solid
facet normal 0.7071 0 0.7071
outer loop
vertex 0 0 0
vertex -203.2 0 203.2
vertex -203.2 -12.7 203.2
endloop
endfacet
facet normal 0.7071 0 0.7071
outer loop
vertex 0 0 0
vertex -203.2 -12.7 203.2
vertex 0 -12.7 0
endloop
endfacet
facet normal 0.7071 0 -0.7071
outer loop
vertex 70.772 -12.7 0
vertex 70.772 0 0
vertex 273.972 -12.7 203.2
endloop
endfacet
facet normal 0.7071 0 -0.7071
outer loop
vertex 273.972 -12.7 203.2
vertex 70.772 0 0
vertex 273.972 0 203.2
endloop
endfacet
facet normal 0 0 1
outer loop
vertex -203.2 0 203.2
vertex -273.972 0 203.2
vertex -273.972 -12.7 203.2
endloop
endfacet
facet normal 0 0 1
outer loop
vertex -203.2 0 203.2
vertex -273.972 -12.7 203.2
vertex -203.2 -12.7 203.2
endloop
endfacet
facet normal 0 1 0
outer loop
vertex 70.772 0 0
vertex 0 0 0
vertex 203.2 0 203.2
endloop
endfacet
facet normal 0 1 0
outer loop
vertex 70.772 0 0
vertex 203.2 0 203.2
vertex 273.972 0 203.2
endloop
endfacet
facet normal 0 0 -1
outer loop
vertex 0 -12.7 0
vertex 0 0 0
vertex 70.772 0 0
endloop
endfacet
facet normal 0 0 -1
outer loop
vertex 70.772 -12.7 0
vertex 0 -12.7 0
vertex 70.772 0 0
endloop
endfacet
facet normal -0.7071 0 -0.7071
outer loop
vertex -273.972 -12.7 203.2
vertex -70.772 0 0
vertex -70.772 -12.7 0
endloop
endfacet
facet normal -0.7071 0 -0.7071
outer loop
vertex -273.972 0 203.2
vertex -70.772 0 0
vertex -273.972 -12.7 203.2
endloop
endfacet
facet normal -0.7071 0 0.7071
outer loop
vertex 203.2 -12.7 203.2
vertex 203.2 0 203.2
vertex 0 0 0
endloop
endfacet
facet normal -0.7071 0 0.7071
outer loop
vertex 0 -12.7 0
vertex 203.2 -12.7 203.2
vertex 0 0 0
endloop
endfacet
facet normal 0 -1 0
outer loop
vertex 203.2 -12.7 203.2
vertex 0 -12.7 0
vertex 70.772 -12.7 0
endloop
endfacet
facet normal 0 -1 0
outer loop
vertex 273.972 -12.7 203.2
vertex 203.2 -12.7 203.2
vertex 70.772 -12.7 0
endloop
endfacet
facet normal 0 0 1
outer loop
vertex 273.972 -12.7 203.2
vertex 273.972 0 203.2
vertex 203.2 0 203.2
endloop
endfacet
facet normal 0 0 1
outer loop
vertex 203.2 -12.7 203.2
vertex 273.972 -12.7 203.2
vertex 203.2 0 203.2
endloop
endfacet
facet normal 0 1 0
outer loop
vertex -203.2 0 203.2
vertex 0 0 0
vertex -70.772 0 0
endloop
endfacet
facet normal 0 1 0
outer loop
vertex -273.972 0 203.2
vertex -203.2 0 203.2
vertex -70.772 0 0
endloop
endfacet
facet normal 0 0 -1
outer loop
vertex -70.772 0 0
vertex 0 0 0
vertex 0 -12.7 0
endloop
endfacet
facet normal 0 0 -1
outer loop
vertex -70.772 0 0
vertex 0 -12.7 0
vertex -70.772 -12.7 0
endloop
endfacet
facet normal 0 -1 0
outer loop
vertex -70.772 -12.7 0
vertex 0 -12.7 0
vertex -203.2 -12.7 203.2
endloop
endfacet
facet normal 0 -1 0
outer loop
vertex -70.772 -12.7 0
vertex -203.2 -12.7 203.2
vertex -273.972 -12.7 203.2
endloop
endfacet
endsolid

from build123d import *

# Parameters (mm, degrees)
F2_DEPTH = 12.7


with BuildPart() as f2:
    # F1 (on face) → F2 (new body)
    with BuildSketch(Plane.XZ):
        Polygon((273.971599, 203.2), (203.2, 203.2), (0, 0), (70.771599, 0), align=None)
    extrude(amount=F2_DEPTH)


with BuildPart() as f3_1:
    # F3: instance of F2
    add(f2.part.mirror(Plane.YZ))


solid = Compound([f2.part, f3_1.part])
